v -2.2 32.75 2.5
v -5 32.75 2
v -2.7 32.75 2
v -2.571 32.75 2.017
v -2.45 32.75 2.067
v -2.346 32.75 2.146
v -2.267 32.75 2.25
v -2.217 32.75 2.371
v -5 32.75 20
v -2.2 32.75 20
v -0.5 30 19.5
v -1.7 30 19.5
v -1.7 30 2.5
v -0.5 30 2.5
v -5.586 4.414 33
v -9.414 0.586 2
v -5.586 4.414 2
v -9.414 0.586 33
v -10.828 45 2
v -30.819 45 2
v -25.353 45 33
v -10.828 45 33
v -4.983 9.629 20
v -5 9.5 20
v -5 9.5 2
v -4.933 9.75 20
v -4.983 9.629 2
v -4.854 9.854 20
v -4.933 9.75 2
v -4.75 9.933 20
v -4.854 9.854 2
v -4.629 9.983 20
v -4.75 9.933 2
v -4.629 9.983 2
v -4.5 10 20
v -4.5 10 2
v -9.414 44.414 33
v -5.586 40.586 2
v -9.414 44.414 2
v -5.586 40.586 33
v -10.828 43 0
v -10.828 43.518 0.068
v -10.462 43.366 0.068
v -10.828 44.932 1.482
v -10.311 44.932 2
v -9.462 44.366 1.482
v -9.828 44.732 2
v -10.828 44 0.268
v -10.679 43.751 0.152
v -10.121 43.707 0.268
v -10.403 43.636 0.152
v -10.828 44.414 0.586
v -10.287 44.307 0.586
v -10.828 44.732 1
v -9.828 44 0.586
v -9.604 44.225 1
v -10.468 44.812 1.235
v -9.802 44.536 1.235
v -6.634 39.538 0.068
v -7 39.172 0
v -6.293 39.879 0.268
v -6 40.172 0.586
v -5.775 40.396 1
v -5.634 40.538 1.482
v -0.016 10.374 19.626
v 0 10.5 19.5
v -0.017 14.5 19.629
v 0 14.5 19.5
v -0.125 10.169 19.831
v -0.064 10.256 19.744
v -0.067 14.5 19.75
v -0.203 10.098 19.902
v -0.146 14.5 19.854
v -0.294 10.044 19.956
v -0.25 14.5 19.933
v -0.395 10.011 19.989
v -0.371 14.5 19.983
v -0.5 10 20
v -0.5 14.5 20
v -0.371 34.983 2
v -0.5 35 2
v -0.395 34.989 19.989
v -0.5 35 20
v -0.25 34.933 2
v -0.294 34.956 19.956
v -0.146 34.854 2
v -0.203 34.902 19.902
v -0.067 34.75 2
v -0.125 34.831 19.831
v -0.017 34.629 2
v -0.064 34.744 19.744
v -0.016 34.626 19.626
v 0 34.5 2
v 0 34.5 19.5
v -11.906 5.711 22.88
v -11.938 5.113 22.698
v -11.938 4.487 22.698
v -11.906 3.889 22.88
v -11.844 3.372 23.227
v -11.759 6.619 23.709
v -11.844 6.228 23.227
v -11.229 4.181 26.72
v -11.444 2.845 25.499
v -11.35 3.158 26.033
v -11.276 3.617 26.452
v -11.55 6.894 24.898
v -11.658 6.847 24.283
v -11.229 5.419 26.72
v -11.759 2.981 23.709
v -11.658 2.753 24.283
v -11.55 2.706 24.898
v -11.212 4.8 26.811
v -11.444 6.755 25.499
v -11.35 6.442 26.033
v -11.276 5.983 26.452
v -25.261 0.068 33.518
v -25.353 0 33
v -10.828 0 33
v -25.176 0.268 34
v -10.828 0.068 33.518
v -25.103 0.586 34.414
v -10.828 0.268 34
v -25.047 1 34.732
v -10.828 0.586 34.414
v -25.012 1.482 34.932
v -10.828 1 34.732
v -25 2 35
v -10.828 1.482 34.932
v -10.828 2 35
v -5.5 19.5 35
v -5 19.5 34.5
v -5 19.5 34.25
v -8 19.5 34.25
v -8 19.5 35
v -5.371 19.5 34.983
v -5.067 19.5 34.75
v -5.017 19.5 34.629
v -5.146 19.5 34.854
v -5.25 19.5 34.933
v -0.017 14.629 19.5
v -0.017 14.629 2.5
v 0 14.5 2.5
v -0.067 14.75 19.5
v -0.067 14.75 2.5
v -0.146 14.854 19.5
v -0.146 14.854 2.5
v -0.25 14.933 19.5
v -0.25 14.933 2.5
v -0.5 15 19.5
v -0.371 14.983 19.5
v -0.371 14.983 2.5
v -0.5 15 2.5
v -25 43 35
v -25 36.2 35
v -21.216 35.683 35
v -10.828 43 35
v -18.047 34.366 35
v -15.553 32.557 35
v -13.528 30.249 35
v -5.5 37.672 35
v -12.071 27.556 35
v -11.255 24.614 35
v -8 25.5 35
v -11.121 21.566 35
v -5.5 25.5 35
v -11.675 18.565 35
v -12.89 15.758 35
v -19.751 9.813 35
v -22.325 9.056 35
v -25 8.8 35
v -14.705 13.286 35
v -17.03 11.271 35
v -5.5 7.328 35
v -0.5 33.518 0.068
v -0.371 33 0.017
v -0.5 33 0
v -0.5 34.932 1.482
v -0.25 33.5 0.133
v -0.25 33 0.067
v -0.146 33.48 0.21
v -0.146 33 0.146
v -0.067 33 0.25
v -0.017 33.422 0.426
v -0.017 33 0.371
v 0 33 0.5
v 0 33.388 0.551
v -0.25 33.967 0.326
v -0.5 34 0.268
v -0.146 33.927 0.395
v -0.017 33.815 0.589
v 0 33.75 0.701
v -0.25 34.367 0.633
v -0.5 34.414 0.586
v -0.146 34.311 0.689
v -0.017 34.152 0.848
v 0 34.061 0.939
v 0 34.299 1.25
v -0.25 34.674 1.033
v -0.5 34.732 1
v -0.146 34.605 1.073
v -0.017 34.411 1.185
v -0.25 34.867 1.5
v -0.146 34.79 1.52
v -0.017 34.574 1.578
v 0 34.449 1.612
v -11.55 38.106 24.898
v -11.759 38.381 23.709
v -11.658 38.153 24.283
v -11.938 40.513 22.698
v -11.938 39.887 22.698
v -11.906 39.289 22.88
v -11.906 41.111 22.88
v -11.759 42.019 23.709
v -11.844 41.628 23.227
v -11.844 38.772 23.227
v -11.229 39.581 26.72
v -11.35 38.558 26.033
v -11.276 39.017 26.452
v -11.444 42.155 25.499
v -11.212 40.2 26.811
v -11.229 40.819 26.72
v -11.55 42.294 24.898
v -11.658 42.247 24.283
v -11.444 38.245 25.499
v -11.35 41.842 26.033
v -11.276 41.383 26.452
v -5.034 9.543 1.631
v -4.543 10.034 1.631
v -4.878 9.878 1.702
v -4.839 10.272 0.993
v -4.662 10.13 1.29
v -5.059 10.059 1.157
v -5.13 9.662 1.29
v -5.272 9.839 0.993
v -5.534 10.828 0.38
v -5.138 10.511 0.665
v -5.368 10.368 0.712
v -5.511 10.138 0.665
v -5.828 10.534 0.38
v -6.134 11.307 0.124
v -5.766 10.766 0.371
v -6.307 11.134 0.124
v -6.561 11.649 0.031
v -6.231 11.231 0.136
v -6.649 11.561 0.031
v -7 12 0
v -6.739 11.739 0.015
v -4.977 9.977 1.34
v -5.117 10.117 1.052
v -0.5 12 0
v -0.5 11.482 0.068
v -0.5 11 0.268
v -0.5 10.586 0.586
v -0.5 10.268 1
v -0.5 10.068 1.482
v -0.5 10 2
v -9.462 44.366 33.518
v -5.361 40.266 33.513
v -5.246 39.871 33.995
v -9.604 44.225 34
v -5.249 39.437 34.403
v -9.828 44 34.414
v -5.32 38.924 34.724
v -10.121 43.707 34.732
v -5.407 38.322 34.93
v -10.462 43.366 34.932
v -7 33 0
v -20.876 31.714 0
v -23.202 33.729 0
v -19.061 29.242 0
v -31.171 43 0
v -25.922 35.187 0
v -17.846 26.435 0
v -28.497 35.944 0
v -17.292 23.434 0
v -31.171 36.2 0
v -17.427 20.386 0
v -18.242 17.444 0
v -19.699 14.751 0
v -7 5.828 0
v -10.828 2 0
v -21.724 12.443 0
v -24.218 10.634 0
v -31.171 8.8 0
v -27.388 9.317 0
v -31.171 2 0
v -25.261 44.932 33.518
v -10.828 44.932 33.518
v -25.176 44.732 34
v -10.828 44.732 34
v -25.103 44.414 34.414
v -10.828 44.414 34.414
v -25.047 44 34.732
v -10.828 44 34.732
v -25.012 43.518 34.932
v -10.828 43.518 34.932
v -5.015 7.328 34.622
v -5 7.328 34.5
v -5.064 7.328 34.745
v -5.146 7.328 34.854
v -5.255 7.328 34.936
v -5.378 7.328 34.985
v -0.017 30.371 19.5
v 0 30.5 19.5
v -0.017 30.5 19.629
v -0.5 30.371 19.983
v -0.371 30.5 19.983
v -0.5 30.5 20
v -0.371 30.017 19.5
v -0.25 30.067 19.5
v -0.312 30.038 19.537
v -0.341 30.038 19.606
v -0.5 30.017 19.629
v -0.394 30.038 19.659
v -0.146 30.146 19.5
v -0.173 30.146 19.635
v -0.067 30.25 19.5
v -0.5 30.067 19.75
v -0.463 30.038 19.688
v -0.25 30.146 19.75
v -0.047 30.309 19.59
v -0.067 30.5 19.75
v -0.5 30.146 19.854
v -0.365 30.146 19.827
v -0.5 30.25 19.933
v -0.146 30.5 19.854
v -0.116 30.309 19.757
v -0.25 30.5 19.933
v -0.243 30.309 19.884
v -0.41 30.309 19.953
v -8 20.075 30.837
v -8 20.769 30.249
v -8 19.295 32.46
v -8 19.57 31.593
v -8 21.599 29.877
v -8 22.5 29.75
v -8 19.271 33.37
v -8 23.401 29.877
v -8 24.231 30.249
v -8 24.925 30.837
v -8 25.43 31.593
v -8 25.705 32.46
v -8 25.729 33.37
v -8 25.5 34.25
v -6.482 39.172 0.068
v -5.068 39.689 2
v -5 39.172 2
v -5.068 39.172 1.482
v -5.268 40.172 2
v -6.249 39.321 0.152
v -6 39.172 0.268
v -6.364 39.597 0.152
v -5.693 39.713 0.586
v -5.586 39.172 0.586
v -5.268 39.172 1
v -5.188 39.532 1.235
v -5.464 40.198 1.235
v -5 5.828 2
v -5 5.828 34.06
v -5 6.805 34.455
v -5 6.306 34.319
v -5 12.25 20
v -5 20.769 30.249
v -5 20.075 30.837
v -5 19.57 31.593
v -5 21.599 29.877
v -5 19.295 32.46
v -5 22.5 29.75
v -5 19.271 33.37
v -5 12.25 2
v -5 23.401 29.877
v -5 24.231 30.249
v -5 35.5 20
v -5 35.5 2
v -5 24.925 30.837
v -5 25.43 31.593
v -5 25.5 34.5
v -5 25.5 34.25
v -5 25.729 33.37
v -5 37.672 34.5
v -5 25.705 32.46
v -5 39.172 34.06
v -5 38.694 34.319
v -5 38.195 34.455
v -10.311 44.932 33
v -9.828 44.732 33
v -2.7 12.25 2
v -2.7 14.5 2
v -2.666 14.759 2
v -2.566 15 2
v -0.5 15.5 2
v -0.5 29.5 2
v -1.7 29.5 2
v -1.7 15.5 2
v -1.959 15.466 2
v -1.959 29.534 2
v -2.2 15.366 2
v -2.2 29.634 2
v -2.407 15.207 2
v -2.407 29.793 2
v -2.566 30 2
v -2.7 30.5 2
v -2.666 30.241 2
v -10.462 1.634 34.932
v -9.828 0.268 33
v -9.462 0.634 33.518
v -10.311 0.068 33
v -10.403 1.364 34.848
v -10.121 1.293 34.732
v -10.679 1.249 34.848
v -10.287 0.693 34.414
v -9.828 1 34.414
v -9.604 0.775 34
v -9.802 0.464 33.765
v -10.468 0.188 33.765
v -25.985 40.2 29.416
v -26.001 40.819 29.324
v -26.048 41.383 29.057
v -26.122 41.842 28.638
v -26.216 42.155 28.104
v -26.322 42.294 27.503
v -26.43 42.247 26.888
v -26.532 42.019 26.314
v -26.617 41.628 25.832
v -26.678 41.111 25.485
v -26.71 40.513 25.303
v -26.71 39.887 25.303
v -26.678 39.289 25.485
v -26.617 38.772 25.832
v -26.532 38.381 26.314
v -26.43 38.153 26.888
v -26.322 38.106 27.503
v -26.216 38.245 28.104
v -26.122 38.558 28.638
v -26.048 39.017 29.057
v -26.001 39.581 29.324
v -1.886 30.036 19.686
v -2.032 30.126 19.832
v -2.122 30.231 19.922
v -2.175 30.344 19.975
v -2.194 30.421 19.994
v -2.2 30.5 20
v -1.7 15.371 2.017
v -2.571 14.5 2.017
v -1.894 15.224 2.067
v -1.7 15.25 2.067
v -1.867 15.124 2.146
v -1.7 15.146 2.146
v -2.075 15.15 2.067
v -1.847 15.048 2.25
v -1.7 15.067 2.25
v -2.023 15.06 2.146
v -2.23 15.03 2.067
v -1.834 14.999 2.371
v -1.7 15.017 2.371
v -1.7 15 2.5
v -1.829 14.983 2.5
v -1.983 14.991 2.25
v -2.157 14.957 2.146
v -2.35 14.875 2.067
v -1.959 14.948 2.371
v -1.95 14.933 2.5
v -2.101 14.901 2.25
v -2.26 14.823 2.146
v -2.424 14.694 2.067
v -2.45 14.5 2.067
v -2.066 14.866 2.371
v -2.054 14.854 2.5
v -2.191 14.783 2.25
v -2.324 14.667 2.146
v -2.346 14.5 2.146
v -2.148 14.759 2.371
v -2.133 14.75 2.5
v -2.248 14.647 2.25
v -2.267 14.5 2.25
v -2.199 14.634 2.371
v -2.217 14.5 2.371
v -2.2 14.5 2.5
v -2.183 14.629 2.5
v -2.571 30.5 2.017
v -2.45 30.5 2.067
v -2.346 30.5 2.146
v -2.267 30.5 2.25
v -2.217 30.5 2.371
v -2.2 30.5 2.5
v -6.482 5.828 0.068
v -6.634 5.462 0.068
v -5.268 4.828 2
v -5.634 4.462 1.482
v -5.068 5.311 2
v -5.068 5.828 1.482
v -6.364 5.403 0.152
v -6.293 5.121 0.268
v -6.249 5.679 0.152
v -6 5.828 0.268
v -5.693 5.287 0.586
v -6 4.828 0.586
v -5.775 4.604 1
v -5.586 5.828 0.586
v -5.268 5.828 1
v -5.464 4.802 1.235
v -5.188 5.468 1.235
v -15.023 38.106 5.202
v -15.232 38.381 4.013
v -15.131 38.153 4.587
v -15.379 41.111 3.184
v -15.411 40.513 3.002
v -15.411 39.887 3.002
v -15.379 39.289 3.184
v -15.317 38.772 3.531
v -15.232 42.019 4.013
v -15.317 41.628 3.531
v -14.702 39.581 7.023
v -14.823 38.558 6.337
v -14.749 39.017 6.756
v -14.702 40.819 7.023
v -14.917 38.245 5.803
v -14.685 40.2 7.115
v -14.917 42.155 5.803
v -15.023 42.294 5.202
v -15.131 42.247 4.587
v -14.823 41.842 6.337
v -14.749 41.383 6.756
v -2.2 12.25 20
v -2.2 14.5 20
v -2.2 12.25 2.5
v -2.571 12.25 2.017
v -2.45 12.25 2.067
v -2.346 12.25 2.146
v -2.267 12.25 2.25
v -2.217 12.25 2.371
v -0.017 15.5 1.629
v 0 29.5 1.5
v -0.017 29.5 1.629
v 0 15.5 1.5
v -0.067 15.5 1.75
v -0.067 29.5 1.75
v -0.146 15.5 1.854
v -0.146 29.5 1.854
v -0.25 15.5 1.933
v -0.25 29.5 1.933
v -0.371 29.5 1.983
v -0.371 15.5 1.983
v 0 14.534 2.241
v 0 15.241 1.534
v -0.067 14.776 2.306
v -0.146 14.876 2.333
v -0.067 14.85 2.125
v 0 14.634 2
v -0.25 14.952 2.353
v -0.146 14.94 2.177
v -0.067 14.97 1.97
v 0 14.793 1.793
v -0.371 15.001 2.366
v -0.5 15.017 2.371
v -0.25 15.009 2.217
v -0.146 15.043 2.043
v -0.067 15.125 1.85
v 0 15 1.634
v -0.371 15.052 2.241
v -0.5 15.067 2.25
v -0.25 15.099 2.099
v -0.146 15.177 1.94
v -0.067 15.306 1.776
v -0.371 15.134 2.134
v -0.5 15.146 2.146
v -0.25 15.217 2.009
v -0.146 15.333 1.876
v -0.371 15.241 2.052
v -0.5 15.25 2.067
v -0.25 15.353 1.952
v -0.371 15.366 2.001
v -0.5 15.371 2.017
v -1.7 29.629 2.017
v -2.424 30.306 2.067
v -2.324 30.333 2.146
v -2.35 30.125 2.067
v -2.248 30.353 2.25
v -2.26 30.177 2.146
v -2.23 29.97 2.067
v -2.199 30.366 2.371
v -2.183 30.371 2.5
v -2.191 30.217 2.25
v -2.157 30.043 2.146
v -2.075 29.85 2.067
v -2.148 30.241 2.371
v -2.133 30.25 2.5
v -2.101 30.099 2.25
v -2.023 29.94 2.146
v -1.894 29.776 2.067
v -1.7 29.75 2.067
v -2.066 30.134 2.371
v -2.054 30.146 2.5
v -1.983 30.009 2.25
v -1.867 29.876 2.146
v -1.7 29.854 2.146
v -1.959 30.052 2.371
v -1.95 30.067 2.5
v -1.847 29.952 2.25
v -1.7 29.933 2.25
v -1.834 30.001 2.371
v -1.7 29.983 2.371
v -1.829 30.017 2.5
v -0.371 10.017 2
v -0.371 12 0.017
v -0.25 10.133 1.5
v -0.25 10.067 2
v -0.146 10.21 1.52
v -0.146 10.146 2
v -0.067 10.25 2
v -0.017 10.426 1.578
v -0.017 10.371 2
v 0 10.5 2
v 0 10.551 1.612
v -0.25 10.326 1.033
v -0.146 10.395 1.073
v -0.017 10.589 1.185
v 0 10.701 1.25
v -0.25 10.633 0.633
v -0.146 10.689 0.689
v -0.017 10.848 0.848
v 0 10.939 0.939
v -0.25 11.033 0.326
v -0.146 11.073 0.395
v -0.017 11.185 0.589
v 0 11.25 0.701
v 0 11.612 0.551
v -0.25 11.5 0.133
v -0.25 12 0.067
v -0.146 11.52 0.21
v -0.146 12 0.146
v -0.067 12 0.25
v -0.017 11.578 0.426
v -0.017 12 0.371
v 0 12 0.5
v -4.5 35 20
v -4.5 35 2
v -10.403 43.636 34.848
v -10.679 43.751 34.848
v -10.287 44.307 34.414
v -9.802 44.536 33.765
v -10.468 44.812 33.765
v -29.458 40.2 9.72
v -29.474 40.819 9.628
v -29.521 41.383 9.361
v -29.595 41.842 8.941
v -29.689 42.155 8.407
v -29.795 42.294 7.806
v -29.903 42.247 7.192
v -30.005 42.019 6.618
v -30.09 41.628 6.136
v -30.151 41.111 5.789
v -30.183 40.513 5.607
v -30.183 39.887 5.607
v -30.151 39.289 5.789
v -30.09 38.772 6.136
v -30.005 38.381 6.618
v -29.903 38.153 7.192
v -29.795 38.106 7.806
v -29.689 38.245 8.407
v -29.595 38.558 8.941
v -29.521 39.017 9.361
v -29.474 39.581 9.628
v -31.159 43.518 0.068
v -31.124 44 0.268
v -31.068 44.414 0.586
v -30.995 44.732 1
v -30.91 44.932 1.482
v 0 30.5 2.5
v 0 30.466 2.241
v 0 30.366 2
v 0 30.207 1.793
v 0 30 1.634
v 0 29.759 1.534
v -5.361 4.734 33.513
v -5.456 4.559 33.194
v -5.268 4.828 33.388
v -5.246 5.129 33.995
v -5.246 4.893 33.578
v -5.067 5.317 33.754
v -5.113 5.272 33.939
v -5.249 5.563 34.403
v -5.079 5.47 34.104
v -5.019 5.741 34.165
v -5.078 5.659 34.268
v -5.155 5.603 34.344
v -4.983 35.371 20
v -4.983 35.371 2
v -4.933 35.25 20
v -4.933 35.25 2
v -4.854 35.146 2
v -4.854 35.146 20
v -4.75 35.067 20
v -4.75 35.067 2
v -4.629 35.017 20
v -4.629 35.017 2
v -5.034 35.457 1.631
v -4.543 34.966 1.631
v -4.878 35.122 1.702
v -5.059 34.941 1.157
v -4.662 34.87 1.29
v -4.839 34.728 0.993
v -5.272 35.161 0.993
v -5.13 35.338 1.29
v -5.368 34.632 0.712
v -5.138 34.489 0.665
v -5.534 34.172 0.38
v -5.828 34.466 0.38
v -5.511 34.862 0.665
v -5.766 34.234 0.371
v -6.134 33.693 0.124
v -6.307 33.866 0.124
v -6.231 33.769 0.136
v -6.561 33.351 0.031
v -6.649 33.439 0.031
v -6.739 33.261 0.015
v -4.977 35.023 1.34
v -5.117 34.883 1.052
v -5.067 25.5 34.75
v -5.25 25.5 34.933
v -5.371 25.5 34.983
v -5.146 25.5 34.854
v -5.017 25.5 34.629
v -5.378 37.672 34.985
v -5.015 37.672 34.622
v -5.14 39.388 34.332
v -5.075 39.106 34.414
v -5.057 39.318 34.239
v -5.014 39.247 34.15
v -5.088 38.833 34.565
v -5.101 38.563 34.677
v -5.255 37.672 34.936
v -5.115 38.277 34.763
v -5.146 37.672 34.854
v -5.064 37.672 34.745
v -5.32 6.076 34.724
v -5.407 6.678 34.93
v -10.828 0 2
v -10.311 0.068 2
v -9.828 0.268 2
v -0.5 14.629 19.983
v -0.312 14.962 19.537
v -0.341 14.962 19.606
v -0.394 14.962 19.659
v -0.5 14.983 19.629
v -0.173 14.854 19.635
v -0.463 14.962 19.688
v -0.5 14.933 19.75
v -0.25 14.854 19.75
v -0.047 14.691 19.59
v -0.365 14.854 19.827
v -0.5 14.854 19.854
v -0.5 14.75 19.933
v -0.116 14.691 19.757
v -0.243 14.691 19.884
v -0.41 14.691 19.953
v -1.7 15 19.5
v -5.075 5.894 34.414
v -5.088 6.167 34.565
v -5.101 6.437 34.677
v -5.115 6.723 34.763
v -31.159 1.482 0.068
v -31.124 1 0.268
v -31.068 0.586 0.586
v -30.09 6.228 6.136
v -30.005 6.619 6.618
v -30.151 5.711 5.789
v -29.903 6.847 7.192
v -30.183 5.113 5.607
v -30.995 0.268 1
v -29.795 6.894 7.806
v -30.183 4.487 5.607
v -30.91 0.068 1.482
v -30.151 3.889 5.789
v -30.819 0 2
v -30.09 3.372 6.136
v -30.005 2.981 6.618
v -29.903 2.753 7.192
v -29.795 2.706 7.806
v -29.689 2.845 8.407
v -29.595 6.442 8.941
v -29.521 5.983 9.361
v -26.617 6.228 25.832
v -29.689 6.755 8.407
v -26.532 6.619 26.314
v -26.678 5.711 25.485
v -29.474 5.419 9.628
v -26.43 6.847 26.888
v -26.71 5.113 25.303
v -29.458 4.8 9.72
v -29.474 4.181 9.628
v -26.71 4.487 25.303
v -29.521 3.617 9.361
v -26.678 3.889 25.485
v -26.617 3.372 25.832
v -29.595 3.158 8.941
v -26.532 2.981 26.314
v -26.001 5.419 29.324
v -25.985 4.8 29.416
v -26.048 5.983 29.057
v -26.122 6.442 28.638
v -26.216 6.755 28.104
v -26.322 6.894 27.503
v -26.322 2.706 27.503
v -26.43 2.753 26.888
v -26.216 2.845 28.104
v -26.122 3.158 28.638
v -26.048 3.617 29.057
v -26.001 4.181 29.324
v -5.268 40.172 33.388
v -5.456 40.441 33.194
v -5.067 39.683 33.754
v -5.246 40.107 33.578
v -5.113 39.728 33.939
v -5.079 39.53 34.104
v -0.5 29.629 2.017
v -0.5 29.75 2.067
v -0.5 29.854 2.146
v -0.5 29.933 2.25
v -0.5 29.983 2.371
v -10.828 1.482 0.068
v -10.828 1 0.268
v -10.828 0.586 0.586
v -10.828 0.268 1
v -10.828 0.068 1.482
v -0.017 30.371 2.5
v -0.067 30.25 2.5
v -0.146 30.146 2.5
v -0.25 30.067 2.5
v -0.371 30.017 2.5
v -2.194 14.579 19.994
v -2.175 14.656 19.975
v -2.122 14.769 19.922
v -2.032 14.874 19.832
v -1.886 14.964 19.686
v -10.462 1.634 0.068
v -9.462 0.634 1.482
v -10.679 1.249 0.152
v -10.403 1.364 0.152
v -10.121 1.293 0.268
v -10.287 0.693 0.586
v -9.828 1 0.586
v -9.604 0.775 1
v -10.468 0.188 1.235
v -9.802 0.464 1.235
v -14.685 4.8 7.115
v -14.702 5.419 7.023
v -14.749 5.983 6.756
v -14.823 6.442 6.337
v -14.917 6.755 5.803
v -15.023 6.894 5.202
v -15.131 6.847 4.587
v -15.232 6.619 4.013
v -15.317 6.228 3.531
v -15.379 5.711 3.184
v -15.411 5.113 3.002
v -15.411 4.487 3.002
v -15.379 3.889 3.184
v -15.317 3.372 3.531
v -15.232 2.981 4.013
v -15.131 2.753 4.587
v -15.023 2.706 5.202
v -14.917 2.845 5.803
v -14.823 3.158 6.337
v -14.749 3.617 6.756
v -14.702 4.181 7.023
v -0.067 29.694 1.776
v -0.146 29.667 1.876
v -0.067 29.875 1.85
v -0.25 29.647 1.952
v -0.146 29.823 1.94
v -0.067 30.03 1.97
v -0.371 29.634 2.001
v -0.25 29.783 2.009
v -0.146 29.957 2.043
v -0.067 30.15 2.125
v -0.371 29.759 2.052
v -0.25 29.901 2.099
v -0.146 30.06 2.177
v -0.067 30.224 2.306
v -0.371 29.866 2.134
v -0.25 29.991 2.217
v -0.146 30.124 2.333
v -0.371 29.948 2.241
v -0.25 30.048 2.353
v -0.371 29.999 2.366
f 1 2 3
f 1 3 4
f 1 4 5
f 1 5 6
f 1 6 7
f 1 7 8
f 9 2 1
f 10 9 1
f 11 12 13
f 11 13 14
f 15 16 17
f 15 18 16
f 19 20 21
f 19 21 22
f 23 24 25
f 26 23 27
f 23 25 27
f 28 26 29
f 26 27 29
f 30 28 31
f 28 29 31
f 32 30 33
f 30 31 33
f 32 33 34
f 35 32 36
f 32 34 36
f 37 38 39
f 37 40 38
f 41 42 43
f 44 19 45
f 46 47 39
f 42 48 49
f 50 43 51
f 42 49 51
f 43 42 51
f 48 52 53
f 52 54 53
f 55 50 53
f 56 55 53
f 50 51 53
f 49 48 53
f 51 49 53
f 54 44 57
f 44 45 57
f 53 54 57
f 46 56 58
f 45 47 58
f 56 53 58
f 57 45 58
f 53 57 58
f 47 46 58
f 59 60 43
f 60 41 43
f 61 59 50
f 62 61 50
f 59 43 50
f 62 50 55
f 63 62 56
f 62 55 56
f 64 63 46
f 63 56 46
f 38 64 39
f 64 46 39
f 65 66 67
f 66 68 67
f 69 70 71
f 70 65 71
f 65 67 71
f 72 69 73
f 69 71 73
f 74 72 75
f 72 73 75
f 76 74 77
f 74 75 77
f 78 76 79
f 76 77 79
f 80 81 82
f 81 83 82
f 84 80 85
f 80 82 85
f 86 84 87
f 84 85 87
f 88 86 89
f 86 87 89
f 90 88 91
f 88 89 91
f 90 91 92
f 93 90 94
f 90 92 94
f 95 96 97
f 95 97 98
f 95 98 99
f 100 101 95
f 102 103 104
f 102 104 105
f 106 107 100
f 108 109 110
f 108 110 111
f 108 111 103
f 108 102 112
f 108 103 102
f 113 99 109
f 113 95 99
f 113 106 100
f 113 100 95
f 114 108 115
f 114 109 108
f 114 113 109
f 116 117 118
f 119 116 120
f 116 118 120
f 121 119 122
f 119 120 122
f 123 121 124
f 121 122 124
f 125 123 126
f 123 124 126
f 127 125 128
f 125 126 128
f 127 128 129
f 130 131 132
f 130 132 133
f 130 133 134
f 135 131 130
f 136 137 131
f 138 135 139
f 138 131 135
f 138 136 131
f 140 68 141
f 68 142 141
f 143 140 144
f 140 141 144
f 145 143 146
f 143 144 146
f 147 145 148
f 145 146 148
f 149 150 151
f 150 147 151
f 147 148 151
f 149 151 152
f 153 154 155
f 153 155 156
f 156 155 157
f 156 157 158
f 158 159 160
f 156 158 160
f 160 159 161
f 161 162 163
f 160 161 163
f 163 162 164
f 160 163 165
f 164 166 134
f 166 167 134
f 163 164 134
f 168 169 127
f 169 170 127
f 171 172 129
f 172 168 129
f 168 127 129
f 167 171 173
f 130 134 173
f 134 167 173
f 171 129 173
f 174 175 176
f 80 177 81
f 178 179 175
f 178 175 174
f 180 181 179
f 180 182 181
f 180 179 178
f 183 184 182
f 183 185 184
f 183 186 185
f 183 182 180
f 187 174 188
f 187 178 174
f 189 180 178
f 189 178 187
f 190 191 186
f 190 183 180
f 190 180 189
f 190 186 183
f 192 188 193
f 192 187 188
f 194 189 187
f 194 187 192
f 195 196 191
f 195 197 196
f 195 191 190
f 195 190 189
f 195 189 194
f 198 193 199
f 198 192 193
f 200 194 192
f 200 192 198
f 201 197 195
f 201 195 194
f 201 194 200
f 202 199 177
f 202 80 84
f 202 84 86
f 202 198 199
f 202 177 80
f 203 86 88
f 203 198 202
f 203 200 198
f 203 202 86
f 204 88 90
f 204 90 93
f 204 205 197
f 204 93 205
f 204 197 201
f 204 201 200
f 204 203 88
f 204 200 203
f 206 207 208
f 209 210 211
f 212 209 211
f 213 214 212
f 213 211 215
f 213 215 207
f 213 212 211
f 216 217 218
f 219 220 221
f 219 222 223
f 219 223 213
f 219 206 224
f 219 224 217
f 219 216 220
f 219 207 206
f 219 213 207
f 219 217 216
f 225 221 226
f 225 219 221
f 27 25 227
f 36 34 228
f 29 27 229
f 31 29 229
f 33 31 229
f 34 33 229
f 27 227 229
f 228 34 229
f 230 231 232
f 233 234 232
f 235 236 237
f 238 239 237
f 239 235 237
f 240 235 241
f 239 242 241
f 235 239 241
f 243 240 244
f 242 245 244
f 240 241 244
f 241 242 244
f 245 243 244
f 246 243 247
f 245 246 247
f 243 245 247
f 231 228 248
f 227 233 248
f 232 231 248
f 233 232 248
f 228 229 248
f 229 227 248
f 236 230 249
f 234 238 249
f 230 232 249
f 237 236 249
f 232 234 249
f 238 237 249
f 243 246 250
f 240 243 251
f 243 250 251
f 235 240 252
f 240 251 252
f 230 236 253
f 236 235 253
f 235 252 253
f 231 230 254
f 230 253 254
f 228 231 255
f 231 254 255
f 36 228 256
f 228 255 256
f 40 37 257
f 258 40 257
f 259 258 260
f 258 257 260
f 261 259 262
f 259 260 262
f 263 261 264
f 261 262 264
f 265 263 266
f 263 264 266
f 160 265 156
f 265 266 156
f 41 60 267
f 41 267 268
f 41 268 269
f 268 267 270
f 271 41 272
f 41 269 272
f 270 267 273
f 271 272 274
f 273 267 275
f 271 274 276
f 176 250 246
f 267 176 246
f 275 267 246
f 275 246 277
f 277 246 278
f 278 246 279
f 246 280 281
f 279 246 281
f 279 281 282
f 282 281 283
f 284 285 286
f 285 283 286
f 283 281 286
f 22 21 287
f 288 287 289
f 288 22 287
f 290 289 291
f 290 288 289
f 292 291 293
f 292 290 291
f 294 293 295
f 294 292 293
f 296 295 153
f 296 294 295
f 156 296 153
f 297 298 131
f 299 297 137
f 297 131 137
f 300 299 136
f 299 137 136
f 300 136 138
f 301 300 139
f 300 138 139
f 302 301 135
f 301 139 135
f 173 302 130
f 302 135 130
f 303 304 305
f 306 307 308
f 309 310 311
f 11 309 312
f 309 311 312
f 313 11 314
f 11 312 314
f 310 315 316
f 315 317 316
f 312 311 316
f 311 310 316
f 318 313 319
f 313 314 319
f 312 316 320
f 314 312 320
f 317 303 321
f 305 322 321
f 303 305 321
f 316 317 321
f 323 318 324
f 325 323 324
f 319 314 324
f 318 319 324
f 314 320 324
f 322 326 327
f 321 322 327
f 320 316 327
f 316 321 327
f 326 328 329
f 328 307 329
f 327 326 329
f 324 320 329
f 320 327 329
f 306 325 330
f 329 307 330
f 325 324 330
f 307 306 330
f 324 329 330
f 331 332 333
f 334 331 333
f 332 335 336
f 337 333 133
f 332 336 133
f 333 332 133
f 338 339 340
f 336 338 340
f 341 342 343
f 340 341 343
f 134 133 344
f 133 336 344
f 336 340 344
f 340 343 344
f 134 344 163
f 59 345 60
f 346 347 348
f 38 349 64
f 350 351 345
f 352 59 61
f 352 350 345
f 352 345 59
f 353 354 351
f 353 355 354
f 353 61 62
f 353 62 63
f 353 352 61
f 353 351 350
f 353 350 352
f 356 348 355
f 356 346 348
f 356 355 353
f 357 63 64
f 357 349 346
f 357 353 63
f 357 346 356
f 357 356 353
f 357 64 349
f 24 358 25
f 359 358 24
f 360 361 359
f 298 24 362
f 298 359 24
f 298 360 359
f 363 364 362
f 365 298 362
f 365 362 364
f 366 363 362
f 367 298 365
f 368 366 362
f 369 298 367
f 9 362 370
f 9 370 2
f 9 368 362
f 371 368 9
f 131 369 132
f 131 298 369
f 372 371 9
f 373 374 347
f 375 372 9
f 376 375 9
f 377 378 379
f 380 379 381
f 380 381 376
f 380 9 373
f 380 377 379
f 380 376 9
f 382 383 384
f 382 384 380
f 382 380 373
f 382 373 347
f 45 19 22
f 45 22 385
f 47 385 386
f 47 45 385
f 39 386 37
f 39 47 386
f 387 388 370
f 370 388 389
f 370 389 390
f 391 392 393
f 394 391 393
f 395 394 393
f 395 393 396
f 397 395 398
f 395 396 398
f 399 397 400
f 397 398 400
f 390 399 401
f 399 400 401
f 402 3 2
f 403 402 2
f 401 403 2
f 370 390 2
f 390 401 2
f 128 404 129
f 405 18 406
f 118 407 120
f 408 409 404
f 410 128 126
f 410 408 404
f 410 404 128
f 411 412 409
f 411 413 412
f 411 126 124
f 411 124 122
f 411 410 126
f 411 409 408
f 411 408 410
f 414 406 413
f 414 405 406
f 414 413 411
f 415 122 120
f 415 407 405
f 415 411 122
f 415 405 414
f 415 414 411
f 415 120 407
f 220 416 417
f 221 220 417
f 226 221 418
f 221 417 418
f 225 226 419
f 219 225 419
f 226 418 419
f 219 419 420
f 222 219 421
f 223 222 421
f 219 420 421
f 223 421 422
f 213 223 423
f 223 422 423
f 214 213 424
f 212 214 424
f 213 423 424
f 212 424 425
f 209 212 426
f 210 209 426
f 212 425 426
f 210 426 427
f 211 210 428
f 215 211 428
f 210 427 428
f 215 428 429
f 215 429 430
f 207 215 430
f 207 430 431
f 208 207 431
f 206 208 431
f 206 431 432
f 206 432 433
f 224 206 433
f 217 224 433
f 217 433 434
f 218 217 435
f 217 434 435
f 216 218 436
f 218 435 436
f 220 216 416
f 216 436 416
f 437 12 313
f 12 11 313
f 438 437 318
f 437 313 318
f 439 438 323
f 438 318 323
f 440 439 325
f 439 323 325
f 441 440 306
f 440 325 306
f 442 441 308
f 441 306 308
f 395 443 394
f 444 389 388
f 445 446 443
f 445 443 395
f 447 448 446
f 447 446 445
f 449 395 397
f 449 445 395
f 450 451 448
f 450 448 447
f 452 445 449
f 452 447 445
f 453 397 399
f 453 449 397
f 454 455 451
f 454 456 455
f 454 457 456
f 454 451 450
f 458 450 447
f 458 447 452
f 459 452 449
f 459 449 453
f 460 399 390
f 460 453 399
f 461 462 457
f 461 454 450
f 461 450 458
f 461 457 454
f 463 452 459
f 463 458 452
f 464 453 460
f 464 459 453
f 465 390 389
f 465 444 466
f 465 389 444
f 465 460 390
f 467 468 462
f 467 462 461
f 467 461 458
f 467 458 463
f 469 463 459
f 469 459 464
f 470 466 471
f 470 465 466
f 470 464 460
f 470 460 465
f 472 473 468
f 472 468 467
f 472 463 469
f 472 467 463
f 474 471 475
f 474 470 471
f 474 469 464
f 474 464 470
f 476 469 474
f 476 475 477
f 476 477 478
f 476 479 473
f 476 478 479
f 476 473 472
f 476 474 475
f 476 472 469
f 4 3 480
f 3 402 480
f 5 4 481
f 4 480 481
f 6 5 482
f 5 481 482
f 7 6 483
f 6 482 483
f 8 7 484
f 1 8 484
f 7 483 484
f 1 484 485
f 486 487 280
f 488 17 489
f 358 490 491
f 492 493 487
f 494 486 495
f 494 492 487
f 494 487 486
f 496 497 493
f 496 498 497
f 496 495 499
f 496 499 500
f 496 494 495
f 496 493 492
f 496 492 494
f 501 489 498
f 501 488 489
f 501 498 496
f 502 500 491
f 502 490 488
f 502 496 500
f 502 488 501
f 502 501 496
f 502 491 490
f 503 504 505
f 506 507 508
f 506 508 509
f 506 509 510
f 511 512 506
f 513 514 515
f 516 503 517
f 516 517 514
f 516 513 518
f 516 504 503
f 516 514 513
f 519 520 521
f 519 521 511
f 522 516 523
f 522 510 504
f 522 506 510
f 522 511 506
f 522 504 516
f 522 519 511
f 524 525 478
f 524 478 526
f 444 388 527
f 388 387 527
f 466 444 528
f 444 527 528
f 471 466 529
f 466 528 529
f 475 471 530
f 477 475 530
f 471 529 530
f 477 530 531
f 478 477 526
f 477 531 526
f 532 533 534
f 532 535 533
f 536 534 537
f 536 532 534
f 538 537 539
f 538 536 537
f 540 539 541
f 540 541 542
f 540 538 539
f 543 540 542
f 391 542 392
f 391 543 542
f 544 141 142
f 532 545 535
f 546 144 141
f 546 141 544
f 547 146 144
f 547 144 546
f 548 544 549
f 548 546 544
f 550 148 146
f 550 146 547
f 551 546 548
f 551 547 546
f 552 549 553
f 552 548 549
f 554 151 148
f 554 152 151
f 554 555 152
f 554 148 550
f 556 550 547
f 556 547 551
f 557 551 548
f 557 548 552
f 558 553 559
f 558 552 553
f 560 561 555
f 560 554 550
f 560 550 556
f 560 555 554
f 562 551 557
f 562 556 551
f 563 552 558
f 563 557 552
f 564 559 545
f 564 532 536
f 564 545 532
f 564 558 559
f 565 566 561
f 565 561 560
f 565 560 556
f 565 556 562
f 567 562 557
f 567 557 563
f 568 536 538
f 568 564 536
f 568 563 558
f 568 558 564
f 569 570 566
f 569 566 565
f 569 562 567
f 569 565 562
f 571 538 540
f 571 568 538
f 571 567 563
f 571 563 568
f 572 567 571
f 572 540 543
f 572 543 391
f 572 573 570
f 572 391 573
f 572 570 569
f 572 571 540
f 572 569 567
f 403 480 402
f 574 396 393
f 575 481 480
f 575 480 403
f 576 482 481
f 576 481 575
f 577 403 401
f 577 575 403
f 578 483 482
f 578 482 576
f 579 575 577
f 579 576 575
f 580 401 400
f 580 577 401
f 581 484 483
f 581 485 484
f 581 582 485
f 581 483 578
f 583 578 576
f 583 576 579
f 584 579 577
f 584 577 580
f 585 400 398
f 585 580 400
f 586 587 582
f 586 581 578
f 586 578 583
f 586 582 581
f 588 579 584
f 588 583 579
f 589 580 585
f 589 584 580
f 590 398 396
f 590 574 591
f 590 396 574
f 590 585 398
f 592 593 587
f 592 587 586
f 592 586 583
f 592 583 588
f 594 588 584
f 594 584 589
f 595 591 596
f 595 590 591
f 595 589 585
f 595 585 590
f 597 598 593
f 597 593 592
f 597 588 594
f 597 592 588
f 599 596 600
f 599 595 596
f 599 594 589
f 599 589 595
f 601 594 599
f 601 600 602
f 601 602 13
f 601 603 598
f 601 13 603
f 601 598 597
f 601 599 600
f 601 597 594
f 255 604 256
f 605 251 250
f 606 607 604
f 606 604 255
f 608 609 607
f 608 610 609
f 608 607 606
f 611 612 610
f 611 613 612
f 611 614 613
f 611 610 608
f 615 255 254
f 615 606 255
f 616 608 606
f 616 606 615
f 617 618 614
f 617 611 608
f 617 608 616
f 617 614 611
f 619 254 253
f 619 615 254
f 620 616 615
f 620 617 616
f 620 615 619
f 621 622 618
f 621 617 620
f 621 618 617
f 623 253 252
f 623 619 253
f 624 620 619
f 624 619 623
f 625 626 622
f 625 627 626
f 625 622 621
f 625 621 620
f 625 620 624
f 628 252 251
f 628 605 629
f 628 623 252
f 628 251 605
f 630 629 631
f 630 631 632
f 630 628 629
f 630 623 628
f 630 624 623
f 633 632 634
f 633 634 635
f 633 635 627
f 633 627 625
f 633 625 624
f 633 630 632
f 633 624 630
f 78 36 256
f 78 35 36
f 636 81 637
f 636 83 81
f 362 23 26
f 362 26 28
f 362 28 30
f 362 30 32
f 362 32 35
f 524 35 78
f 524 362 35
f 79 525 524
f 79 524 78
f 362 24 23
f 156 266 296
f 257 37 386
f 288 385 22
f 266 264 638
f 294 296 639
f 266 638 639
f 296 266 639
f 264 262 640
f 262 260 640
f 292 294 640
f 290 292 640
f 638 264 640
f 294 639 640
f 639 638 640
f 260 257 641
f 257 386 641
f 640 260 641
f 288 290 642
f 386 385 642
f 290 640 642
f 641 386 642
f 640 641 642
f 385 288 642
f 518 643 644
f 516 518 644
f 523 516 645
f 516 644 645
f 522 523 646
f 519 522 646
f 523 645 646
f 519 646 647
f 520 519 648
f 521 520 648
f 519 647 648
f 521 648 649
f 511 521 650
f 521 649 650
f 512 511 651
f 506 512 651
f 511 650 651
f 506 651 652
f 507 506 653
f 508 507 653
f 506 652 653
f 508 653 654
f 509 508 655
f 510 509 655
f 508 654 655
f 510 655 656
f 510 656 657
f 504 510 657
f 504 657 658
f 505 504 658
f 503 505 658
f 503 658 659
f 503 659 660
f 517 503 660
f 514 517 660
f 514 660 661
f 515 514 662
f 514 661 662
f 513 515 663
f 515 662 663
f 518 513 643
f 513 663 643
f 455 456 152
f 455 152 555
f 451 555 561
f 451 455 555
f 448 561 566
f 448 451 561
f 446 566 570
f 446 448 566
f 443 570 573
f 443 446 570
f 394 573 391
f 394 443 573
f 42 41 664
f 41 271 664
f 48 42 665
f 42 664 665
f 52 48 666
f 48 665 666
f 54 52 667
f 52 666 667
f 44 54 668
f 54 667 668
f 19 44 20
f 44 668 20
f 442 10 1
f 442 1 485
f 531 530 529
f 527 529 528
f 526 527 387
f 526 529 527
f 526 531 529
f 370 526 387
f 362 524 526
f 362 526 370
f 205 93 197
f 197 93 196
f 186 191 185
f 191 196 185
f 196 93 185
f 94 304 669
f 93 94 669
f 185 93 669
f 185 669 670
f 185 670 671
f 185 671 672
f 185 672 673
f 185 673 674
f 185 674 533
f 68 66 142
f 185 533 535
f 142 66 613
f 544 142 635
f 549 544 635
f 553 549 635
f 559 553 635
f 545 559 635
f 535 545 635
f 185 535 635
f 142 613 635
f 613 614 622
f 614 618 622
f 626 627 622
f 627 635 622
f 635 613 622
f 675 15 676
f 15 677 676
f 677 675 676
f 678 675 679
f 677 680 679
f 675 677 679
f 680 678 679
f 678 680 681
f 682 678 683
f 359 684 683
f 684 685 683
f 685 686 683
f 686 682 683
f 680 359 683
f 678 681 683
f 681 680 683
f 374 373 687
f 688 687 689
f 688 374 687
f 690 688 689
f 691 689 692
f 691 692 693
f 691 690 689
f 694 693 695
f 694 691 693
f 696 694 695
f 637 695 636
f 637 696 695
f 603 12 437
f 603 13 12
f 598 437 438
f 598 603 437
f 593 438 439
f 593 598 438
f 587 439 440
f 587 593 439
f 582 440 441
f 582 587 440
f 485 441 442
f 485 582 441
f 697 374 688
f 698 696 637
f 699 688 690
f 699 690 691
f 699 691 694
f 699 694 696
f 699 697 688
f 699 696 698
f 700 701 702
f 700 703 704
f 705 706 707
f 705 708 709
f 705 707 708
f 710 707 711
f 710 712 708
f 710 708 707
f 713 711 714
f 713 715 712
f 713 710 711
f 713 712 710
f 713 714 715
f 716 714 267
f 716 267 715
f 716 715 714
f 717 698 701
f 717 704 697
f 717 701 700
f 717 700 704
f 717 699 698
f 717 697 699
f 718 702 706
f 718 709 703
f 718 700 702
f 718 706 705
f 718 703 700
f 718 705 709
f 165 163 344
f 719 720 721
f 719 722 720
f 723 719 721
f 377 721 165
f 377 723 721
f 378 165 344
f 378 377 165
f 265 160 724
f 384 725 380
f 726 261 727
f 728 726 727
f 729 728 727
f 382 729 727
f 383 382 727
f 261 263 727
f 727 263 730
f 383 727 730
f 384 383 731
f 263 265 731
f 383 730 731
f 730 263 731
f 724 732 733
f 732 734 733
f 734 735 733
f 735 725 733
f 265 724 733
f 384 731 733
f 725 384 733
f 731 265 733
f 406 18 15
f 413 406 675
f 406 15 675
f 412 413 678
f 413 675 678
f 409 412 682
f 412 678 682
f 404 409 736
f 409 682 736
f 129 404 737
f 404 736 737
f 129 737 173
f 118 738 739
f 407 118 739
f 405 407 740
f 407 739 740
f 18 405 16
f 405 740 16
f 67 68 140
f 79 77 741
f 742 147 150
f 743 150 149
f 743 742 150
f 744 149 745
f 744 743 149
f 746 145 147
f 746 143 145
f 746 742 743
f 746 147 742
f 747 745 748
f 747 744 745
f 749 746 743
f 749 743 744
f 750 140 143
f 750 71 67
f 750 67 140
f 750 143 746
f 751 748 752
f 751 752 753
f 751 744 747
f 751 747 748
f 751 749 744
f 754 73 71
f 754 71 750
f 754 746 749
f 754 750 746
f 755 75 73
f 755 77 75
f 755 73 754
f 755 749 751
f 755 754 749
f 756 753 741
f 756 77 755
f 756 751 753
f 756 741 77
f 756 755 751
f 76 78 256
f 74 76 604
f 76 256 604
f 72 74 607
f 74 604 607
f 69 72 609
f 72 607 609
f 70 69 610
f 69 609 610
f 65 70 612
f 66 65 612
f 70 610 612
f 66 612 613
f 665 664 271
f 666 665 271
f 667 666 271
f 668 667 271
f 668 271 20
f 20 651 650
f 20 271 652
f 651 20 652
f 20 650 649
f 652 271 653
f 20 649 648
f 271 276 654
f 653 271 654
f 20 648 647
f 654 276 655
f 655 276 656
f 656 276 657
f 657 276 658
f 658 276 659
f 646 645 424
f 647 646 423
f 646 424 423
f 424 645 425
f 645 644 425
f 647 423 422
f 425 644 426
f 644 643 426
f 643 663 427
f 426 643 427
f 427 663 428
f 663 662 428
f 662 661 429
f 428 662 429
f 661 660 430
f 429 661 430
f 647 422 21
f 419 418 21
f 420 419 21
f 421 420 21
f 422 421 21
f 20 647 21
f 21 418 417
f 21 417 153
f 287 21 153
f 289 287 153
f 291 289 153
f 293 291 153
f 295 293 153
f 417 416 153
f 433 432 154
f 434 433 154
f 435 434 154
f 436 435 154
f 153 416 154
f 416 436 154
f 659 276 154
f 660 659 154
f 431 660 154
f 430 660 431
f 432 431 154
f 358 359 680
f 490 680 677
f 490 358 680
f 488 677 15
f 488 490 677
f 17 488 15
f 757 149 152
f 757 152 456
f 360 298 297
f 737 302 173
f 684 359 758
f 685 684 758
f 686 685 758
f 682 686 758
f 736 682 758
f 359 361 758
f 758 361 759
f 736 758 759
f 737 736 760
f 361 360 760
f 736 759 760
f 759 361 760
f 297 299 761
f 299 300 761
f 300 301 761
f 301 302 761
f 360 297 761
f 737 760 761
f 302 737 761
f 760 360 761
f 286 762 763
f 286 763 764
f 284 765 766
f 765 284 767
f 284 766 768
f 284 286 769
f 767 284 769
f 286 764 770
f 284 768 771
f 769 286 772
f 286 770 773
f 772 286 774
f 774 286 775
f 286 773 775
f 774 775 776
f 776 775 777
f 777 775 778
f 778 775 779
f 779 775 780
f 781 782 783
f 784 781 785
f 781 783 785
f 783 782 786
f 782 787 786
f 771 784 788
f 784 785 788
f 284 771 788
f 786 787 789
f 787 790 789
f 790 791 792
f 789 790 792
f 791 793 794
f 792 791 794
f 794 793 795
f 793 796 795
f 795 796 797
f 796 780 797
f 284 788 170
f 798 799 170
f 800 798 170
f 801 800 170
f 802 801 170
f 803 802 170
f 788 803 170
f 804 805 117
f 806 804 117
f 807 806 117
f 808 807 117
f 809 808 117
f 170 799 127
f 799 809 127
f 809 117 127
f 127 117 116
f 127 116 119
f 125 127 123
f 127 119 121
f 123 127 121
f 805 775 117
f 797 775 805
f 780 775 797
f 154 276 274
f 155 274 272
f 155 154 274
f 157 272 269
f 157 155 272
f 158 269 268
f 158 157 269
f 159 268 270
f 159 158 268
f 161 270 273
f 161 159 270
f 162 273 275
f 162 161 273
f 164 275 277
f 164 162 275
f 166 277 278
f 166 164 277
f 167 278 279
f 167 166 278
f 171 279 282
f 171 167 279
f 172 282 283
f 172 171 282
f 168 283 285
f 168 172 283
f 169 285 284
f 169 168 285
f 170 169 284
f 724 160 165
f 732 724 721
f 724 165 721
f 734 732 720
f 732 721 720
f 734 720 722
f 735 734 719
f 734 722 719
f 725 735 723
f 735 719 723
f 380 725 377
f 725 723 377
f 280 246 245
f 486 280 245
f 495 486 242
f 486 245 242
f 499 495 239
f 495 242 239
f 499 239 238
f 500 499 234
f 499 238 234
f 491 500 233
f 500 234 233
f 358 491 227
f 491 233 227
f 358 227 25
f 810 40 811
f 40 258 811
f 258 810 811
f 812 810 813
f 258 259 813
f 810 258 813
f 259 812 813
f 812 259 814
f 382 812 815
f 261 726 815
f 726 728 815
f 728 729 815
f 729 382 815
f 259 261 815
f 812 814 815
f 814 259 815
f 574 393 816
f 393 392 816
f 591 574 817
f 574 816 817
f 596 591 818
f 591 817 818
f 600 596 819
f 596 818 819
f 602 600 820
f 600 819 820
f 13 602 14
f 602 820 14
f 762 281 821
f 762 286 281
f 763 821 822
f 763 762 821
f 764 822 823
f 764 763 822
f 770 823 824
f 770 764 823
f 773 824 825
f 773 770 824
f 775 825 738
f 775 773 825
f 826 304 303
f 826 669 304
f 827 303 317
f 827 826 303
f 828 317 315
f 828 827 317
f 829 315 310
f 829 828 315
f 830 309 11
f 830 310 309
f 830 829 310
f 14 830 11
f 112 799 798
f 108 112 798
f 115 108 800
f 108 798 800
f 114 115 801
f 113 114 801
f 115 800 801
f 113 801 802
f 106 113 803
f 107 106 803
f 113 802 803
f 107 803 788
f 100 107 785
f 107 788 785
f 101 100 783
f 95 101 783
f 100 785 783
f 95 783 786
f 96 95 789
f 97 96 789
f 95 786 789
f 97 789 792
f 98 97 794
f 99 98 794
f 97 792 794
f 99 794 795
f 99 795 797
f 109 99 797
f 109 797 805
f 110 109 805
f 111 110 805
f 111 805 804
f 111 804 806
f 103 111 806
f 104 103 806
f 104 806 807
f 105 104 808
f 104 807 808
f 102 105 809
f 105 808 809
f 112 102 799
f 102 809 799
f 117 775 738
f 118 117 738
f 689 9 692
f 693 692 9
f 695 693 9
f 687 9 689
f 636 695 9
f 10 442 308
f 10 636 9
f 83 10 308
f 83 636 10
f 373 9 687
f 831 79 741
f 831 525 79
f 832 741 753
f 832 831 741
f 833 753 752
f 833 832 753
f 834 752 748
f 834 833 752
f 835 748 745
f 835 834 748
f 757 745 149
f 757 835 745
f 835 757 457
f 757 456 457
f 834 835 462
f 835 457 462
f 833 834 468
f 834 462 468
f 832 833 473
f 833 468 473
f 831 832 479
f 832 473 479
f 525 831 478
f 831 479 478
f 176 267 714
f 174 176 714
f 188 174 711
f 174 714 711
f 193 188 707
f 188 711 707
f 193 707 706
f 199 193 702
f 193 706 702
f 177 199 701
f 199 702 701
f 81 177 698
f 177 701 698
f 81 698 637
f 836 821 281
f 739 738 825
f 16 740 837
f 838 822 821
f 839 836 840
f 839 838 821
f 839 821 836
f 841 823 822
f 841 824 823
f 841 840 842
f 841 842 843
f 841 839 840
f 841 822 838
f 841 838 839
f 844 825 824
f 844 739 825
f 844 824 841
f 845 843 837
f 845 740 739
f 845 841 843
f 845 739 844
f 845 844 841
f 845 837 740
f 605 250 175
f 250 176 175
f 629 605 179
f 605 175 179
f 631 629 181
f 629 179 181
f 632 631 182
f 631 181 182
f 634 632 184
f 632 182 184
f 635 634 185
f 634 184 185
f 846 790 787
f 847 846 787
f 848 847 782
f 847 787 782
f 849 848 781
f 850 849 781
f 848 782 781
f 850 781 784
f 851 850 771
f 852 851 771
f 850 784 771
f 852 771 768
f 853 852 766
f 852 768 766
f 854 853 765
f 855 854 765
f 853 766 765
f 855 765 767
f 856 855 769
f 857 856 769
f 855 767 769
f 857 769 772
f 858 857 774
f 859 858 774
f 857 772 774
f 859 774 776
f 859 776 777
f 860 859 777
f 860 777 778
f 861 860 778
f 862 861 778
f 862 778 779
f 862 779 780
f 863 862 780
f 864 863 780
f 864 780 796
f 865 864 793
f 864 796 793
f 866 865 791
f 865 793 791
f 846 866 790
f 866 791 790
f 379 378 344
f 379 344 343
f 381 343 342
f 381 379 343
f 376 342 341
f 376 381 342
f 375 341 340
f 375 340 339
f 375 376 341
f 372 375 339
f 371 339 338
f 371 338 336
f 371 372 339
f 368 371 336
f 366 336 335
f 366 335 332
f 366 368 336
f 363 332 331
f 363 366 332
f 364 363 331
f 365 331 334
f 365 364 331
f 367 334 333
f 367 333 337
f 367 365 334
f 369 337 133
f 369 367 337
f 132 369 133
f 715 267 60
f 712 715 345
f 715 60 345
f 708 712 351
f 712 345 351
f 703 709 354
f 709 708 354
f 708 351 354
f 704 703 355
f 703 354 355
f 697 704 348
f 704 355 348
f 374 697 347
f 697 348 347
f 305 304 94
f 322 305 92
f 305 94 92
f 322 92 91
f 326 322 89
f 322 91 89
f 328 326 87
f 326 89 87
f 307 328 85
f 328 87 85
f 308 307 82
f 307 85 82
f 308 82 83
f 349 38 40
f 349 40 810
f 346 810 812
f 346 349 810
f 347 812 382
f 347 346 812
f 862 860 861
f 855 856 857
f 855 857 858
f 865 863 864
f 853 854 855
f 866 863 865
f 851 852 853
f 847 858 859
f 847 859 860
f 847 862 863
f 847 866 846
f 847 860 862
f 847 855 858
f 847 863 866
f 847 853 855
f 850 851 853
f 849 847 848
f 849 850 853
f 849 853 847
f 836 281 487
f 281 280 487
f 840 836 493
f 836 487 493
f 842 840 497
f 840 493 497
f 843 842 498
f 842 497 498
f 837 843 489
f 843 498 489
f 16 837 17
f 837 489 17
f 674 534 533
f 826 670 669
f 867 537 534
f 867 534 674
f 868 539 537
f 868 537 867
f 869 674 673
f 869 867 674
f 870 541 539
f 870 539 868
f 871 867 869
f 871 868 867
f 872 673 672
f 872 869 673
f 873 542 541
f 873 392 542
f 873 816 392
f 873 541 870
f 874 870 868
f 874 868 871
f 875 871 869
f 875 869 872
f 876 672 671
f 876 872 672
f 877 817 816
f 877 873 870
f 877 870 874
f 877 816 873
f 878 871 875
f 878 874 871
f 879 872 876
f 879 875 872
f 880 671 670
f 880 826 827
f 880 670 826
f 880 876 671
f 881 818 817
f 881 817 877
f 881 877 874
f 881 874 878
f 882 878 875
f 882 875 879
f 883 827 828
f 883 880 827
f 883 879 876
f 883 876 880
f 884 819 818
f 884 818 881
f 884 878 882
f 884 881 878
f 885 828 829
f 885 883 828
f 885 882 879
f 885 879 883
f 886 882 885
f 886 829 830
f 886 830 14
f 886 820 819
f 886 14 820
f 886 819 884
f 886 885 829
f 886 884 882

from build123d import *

# Parameters (mm, degrees)
BOSS_EXTRUDE1_DEPTH     = 45
CUT_EXTRUDE1_DEPTH      = 66.041883154
CUT_EXTRUDE1_DEPTH_BACK = 66.041883154
SKETCH2_R               = 13.7
CUT_EXTRUDE2_DEPTH      = 65.974294466
SKETCH4_W               = 5
SKETCH4_H               = 25
CUT_EXTRUDE3_DEPTH      = 15
CUT_EXTRUDE4_DEPTH      = 18
CUT_EXTRUDE5_DEPTH      = 3
SKETCH8_R               = 2.1
CUT_EXTRUDE6_DEPTH      = 15
FILLET1_R               = 2
FILLET2_R               = 0.5


with BuildPart() as part:
    # Sketch1 → Boss-Extrude1 (new body)
    with BuildSketch(Plane(origin=(0, 0, 0), x_dir=(1, 0, 0), z_dir=(0, 1, 0))):
        Polygon((0, 0), (-31.171444325, 0), (-25, -35), (0, -35), align=None)
    extrude(amount=BOSS_EXTRUDE1_DEPTH)

    # Sketch2 → Cut-Extrude1 (cut, two sides: drawn at the far end of the back side and taken through both)
    with BuildSketch(Plane(origin=(5.231510268, 0, 29.669369072), x_dir=(-0.9848077530122074, 0, 0.17364817766693474), z_dir=(-0.17364817766693474, 0, -0.9848077530122074)).offset(-CUT_EXTRUDE1_DEPTH_BACK)):
        with Locations((30.697880044, 22.5)):
            Circle(SKETCH2_R)
    extrude(amount=CUT_EXTRUDE1_DEPTH + CUT_EXTRUDE1_DEPTH_BACK, mode=Mode.SUBTRACT)

    # Sketch3 → Cut-Extrude2 (cut, through all)
    with BuildSketch(Plane.XY.offset(35)):
        Polygon((-5, 35), (-5, 40), (-10, 45), (0, 45), (0, 35), align=None)
        Polygon((-5, 10), (0, 10), (0, 0), (-10, 0), (-5, 5), align=None)
    extrude(amount=-CUT_EXTRUDE2_DEPTH, mode=Mode.SUBTRACT)

    # Sketch4 → Cut-Extrude3 (cut)
    with BuildSketch(Plane.XY.offset(35)):
        with Locations((-2.5, 22.5)):
            Rectangle(SKETCH4_W, SKETCH4_H)
    extrude(amount=-CUT_EXTRUDE3_DEPTH, mode=Mode.SUBTRACT)

    # Sketch5 → Cut-Extrude4 (cut)
    with BuildSketch(Plane.XY.offset(20)):
        Polygon((-5, 32.75), (-2.2, 32.75), (-2.2, 30), (0, 30), (0, 15), (-2.2, 15), (-2.2, 12.25), (-5, 12.25), align=None)
    extrude(amount=-CUT_EXTRUDE4_DEPTH, mode=Mode.SUBTRACT)

    # Sketch6 → Cut-Extrude5 (cut)
    with BuildSketch(Plane(origin=(-5, 0, 0), x_dir=(0, 0, -1), z_dir=(1, 0, 0))):
        with BuildLine():
            Line((-35, 19.5), (-35, 25.5))
            Line((-35, 25.5), (-34.25, 25.5))
            ThreePointArc((-34.25, 25.5), (-29.75, 22.5), (-34.25, 19.5))
            Line((-34.25, 19.5), (-35, 19.5))
        make_face()
    extrude(amount=-CUT_EXTRUDE5_DEPTH, mode=Mode.SUBTRACT)

    # Sketch8 → Cut-Extrude6 (cut)
    with BuildSketch(Plane(origin=(-30.231510268, 0, 5.330630928), x_dir=(0.17364817766693477, 0, 0.9848077530122074), z_dir=(-0.9848077530122072, 0, 0.17364817766693474))):
        with Locations((2.357101206, 40.2)):
            Circle(SKETCH8_R)
        with Locations((22.357101206, 40.2)):
            Circle(SKETCH8_R)
        with Locations((22.357101206, 4.8)):
            Circle(SKETCH8_R)
        with Locations((2.357101206, 4.8)):
            Circle(SKETCH8_R)
    extrude(amount=-CUT_EXTRUDE6_DEPTH, mode=Mode.SUBTRACT)

    # Fillet1
    fillet1_edges = [part.edges().sort_by_distance(p)[0] for p in [
        (-17.5, 45, 35),
        (-20.585722162, 0, 0),
        (-7.5, 2.5, 0),
        (-10, 0, 17.5),
        (-5, 7.5, 0),
        (-5, 5, 17.5),
        (-2.5, 10, 0),
        (-7.5, 2.5, 35),
        (-20.585722162, 45, 0),
        (-2.5, 35, 0),
        (-5, 37.5, 0),
        (-7.5, 42.5, 0),
        (-5, 40, 17.5),
        (-10, 45, 17.5),
        (-17.5, 0, 35),
        (-7.5, 42.5, 35),
    ]]
    fillet(fillet1_edges, radius=FILLET1_R)

    # Fillet2
    fillet2_edges = [part.edges().sort_by_distance(p)[0] for p in [
        (0, 22.5, 0),
        (0, 10, 11),
        (0, 35, 11),
        (0, 10.585786438, 0.585786438),
        (0, 34.414213562, 0.585786438),
        (-5, 35, 11),
        (-5, 10, 11),
        (-5, 31.335786438, 35),
        (-5, 38.216836977, 34.85841639),
        (-5, 6.783163023, 34.85841639),
        (-5.163269118, 39.963039656, 33.739113334),
        (-5.707902185, 34.292097815, 0.473407966),
        (-5.163269118, 5.036960344, 33.739113334),
        (-5.707902185, 10.707902185, 0.473407966),
        (0, 12.5, 20),
        (0, 32.5, 20),
        (-2.2, 30, 11),
        (0, 30, 11),
        (0, 15, 11),
        (-2.2, 15, 11),
        (-1.1, 15, 20),
        (-1.1, 30, 20),
        (-2.2, 31.375, 2),
        (-1.1, 30, 2),
        (0, 22.5, 2),
        (-1.1, 15, 2),
        (-2.2, 13.625, 2),
        (-5, 13.664213562, 35),
    ]]
    fillet(fillet2_edges, radius=FILLET2_R)


solid = part.part
